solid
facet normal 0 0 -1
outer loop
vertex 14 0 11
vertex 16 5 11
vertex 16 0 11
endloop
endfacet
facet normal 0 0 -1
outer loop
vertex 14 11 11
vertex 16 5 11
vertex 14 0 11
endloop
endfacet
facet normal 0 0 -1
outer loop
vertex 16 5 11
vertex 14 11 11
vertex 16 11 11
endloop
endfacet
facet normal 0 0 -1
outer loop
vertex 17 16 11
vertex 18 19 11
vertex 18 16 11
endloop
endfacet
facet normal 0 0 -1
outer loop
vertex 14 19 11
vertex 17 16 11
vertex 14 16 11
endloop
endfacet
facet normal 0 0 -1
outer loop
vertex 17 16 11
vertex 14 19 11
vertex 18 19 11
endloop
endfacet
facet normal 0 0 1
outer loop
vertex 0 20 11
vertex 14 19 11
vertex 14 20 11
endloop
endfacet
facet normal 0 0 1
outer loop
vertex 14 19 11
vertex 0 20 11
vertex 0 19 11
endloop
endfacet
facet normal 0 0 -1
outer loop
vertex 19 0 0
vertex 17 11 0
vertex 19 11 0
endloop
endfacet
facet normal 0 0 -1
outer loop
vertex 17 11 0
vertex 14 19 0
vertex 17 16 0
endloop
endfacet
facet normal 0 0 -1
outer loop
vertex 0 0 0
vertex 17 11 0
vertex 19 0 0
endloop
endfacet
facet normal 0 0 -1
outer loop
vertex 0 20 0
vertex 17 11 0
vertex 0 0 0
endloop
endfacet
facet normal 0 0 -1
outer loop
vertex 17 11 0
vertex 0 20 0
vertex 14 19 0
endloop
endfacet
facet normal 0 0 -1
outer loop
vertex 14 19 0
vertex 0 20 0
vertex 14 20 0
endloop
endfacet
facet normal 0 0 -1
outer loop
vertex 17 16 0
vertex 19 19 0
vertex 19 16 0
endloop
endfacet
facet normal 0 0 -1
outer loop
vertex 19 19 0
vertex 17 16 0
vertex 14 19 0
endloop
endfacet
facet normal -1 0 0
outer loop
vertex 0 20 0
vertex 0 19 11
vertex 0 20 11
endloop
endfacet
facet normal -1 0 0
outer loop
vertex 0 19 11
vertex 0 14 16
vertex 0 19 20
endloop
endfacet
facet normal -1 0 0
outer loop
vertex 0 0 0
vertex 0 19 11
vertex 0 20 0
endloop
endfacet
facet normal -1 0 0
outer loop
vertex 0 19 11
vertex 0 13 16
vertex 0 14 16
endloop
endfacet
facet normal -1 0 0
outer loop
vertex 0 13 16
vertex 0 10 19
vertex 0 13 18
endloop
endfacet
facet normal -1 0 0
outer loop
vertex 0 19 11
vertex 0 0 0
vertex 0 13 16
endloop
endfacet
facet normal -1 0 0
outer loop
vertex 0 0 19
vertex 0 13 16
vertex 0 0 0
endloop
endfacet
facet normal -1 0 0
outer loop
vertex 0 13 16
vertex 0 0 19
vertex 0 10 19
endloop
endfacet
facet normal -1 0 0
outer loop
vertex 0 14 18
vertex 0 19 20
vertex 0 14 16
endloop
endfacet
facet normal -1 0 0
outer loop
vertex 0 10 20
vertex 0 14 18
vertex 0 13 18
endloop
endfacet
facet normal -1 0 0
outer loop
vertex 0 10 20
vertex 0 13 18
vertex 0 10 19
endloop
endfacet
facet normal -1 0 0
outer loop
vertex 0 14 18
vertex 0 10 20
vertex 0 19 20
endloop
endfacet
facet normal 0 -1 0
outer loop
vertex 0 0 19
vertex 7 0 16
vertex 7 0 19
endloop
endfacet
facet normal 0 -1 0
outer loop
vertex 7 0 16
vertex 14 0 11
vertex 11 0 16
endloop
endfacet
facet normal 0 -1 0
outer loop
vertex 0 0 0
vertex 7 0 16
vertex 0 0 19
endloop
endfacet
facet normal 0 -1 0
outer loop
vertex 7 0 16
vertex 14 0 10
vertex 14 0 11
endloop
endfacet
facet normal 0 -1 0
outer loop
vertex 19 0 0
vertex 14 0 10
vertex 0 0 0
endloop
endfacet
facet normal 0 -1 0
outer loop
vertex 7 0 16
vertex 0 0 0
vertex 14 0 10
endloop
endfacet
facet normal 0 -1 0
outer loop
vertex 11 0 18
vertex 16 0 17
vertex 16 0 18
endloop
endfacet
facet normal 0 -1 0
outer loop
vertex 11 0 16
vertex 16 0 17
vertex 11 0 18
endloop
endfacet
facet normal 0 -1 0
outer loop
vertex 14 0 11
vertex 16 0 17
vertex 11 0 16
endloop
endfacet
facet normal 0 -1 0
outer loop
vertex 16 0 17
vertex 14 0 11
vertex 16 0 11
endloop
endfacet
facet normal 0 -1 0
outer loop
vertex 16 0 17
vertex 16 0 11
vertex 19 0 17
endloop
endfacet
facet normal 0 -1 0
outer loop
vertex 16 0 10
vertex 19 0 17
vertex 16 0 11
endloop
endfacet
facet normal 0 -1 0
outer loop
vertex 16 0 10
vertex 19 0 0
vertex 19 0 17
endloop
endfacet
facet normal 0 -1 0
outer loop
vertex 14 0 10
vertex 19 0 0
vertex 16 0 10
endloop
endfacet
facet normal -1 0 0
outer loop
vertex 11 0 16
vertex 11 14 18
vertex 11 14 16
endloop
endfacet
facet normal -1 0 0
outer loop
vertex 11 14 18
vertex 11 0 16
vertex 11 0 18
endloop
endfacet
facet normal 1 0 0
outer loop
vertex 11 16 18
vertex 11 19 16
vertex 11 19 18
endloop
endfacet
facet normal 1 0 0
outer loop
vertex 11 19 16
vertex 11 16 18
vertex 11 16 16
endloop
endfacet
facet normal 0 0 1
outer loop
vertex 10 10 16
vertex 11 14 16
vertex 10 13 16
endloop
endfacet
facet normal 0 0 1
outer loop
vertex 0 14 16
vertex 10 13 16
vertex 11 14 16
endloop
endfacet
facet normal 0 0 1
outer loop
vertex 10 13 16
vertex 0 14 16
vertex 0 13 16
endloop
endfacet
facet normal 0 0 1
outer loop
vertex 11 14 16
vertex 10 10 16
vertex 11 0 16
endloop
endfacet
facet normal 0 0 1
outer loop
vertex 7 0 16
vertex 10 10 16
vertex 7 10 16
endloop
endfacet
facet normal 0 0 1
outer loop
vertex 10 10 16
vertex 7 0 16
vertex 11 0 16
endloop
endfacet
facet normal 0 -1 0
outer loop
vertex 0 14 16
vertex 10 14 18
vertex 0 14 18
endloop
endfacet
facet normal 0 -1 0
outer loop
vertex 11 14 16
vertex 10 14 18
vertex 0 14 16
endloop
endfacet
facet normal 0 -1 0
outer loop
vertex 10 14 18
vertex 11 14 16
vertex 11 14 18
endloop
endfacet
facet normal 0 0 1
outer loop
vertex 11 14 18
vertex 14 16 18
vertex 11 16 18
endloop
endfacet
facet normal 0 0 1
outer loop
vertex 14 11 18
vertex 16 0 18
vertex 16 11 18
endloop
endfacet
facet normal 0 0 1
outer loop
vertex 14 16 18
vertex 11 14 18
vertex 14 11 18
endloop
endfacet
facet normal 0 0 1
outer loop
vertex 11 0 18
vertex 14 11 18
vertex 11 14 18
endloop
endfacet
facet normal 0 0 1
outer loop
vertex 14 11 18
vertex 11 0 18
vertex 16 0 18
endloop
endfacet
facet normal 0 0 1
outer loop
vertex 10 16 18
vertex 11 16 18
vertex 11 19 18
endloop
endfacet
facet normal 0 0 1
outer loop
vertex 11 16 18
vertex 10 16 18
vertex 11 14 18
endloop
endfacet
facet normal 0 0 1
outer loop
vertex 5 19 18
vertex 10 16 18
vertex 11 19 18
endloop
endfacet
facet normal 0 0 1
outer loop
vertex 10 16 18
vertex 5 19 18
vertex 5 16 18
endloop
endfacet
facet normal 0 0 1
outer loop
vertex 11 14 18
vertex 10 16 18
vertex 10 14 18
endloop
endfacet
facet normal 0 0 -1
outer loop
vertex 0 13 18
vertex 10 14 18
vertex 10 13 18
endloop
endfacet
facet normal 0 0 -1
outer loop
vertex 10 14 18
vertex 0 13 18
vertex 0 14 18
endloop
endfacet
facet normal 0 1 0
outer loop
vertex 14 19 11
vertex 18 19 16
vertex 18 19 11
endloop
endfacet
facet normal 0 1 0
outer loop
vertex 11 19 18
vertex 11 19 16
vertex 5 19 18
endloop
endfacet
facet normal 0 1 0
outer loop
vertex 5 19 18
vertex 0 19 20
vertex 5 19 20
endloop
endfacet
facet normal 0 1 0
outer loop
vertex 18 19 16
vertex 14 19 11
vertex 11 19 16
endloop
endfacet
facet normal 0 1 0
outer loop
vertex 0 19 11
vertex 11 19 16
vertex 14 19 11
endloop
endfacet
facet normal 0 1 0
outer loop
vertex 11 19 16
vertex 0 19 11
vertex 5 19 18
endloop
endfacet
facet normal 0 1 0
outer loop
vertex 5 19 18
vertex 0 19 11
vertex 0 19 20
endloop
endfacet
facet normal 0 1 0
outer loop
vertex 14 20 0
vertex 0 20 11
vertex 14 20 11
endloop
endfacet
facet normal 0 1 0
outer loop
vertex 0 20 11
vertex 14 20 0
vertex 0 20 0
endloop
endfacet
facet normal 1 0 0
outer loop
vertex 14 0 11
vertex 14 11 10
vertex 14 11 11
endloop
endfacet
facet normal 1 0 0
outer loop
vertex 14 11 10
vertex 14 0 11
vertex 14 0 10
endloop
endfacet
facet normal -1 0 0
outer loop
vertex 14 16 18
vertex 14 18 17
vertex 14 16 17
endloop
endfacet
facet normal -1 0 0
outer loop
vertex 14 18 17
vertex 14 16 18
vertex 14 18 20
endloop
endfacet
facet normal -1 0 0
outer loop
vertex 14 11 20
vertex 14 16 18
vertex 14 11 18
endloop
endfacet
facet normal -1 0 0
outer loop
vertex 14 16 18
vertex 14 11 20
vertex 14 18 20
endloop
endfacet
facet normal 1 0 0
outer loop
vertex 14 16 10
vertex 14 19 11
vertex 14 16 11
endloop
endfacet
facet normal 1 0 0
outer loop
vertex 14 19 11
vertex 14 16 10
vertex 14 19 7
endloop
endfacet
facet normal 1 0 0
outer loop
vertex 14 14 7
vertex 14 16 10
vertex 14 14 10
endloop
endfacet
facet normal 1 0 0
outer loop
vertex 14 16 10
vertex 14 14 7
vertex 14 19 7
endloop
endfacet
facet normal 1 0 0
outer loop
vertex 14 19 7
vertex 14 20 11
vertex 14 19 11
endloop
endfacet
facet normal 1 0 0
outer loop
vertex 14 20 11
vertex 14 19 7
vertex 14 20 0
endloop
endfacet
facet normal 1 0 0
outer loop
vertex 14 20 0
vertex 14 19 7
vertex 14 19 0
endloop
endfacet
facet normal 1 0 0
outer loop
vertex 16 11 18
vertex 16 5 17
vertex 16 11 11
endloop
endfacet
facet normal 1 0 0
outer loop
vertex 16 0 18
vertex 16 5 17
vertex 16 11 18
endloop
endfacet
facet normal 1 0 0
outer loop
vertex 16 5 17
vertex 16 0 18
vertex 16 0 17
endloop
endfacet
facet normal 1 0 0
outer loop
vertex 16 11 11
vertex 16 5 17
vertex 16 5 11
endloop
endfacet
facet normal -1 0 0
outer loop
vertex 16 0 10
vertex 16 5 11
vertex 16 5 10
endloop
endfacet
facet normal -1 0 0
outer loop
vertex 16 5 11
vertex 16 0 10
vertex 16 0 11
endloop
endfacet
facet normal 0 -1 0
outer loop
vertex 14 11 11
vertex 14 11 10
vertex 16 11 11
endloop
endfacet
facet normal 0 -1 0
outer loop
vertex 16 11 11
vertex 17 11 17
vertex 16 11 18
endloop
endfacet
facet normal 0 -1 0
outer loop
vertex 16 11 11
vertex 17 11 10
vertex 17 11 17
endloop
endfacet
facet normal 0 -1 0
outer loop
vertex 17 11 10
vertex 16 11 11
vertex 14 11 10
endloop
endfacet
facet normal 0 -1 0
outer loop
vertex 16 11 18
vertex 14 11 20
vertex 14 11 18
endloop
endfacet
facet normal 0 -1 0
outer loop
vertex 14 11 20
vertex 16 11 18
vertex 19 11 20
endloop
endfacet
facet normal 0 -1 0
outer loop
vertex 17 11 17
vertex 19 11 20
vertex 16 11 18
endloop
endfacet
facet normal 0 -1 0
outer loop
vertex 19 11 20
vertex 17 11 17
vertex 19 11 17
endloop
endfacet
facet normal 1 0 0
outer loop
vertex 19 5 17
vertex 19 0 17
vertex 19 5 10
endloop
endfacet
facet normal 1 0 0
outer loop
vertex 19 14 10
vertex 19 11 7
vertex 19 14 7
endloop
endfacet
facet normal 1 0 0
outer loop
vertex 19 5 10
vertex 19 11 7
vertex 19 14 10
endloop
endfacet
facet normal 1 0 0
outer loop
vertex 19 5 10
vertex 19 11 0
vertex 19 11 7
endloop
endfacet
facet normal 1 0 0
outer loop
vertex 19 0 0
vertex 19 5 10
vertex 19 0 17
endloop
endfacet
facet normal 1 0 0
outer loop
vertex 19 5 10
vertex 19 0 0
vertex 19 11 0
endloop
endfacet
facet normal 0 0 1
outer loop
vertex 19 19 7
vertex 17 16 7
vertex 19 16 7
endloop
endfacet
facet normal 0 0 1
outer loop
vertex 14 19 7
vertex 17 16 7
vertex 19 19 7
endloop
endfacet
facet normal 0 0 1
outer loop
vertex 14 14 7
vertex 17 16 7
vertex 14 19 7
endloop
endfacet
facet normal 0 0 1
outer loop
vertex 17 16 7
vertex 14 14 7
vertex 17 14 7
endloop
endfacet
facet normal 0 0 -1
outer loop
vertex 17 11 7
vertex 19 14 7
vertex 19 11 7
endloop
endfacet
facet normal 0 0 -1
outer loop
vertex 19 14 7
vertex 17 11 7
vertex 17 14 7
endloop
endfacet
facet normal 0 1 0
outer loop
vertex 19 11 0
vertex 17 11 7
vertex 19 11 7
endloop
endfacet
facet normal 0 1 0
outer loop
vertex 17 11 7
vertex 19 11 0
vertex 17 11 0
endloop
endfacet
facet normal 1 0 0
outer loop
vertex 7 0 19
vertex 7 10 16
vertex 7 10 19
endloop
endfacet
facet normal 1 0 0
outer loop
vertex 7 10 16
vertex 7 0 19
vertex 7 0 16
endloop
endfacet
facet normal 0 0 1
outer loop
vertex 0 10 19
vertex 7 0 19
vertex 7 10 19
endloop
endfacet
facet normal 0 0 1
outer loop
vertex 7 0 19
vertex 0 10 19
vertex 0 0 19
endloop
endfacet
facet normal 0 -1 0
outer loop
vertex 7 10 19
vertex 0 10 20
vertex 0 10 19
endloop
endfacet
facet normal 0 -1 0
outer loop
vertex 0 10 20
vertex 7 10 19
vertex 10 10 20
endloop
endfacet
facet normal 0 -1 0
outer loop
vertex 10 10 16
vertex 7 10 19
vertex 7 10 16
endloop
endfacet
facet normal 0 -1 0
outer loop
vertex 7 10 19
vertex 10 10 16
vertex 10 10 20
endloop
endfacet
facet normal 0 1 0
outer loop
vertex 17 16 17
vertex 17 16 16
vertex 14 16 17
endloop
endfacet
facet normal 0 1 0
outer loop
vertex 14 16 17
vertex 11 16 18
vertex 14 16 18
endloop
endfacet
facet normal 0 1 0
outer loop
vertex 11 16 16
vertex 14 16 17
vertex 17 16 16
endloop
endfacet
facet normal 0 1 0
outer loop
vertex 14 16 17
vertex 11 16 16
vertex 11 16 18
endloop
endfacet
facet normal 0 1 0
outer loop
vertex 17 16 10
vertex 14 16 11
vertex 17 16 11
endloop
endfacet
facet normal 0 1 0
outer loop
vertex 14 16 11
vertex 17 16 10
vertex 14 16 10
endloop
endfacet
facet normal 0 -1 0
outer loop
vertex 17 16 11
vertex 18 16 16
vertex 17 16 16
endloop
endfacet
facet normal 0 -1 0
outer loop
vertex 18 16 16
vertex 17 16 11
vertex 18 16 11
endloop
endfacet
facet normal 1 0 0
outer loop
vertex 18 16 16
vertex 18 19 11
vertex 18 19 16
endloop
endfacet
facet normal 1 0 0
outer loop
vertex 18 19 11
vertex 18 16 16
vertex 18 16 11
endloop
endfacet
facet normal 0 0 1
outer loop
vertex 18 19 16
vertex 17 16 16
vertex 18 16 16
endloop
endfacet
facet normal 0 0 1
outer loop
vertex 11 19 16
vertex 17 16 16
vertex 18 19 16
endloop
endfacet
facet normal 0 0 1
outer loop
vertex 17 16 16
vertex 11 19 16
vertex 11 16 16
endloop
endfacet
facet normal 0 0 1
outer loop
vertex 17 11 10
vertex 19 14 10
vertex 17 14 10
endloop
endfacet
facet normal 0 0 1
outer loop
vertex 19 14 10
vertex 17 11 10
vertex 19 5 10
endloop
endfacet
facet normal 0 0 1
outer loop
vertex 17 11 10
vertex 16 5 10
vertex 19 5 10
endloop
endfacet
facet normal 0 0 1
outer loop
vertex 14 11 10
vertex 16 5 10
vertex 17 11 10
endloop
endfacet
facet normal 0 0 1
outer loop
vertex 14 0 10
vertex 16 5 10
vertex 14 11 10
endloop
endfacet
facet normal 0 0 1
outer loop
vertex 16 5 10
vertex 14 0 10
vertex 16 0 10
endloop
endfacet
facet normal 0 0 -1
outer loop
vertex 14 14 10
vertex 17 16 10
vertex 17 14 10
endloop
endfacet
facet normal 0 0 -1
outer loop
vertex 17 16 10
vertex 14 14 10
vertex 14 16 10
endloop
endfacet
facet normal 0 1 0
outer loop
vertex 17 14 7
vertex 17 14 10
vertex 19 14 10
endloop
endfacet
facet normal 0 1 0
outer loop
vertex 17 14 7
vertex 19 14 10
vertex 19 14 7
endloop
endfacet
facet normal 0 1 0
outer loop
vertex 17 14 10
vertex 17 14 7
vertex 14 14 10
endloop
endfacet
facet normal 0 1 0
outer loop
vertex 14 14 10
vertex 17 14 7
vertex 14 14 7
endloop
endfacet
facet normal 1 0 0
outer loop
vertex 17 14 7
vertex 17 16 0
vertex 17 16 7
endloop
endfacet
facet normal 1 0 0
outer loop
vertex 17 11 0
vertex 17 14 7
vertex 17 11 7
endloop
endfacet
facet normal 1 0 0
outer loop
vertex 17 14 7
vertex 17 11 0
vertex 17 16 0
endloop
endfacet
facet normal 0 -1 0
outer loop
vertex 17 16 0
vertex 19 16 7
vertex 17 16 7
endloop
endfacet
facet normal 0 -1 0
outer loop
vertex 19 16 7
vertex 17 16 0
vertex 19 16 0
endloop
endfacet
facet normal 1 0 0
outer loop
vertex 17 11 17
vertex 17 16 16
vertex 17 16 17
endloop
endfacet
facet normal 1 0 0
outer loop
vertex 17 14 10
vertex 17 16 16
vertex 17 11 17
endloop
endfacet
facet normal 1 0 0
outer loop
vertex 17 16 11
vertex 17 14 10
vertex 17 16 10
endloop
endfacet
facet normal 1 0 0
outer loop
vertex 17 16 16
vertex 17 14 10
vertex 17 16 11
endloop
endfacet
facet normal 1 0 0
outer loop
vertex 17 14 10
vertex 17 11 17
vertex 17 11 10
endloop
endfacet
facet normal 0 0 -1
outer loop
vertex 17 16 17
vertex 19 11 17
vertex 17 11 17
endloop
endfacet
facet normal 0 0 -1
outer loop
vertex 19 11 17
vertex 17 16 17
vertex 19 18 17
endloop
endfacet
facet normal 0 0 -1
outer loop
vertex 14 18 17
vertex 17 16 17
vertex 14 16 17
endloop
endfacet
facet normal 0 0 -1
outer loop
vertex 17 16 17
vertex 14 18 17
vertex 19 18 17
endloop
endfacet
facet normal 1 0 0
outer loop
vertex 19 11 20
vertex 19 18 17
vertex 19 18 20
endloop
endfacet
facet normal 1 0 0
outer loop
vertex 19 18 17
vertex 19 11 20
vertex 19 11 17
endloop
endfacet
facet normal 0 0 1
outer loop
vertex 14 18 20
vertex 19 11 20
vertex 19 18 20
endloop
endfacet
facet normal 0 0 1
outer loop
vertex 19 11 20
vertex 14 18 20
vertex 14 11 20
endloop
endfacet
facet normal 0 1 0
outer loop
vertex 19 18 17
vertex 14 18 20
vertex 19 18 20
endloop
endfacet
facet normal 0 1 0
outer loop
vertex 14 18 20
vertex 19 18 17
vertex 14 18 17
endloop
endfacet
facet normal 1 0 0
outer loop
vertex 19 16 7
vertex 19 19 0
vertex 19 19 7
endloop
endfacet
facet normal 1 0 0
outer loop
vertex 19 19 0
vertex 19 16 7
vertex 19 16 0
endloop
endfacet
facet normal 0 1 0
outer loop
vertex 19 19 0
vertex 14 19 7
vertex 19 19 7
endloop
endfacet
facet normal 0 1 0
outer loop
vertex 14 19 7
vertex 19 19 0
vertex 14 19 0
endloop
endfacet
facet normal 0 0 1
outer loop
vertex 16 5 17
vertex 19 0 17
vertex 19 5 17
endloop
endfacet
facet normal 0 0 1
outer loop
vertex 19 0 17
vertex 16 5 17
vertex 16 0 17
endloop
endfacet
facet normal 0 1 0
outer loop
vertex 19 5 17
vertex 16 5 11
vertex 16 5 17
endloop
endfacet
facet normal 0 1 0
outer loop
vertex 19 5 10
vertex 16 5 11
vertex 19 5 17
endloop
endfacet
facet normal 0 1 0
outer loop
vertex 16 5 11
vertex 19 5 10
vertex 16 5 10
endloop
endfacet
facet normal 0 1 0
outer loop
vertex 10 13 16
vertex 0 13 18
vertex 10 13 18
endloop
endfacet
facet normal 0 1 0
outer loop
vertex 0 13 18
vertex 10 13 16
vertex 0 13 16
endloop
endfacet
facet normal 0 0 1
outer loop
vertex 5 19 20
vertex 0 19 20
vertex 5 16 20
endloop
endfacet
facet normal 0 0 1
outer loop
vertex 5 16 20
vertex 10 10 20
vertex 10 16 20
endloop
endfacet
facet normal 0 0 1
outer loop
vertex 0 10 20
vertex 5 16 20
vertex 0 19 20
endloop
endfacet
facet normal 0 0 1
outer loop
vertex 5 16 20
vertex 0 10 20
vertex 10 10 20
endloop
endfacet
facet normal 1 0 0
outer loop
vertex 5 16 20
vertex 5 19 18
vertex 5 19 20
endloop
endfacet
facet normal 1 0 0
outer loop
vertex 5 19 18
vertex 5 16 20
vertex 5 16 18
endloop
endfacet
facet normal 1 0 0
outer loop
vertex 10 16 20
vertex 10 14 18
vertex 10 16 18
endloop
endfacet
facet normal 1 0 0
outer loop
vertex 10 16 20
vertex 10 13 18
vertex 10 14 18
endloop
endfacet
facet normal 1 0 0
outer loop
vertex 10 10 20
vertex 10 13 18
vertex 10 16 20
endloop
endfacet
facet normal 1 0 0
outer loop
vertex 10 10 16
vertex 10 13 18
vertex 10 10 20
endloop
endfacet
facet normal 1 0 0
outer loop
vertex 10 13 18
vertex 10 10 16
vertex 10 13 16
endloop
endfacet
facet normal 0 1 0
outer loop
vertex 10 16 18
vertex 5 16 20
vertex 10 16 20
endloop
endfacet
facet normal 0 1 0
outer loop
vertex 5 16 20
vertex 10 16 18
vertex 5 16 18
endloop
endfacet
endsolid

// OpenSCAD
translate([3.5, 2.5, 5.5]) color([0.37864807032309444, 0.8754233917130172, 0.5681514209101919]) cube([7, 5, 11], center=true);
translate([5.5, 3.5, 13.5]) color([0.4144063966836443, 0.40226707511907955, 0.7018296239336754]) cube([11, 7, 5], center=true);
translate([3.5, 7.5, 5.5]) color([0.41822655329246605, 0.6621958889738174, 0.04677968595679827]) cube([7, 5, 11], center=true);
translate([5.5, 10.5, 13.5]) color([0.44535218971882984, 0.25922692344722276, 0.15768657212231085]) cube([11, 7, 5], center=true);
translate([3.5, 12.5, 5.5]) color([0.5275731301676146, 0.48726560106903205, 0.5614049256144269]) cube([7, 5, 11], center=true);
translate([5.5, 16.5, 14.5]) color([0.7554847672586825, 0.8838751542487009, 0.4945826703752868]) cube([11, 5, 7], center=true);
translate([3.5, 17.5, 5.5]) color([0.31205824641687296, 0.46689223535252355, 0.8090458573603624]) cube([7, 5, 11], center=true);
translate([10.5, 2.5, 5.5]) color([0.8750163314802711, 0.8124149323637591, 0.188001294050828]) cube([7, 5, 11], center=true);
translate([10.5, 7.5, 5.5]) color([0.9994203594553304, 0.6330887599183004, 0.08346705017572931]) cube([7, 5, 11], center=true);
translate([10.5, 12.5, 5.5]) color([0.7255543554613124, 0.9868214802051282, 0.40181682221254356]) cube([7, 5, 11], center=true);
translate([10.5, 17.5, 5.5]) color([0.6785150052419683, 0.31617713722134233, 0.2135246620646961]) cube([7, 5, 11], center=true);
translate([13.5, 5.5, 14.5]) color([0.7173241433110372, 0.0023575647193538884, 0.8227314105314157]) cube([5, 11, 7], center=true);
translate([16.5, 5.5, 3.5]) color([0.5283459768597928, 0.09778434180065931, 0.11890389478474583]) cube([5, 11, 7], center=true);
translate([3.5, 2.5, 17.5]) color([0.6492654248961536, 0.8736538239003423, 0.27998274332687256]) cube([7, 5, 3], center=true);
translate([3.5, 7.5, 17.5]) color([0.9785151867733981, 0.10018068906370903, 0.8539381095973382]) cube([7, 5, 3], center=true);
translate([12.5, 13.5, 14.5]) color([0.39669617733090445, 0.08134541676823415, 0.2747138434192621]) cube([3, 5, 7], center=true);
translate([14.5, 17.5, 13.5]) color([0.4529781848179143, 0.7923415311856522, 0.8613599036372361]) cube([7, 3, 5], center=true);
translate([16.5, 3.5, 8.5]) color([0.13342055420254906, 0.5208655284141989, 0.6507832381497373]) cube([5, 7, 3], center=true);
translate([16.5, 10.5, 8.5]) color([0.3470530145996015, 0.8718638357105861, 0.27840981521636055]) cube([5, 7, 3], center=true);
translate([15.5, 13.5, 3.5]) color([0.01857432754559518, 0.0406632736752609, 0.6809967701112433]) cube([3, 5, 7], center=true);
translate([15.5, 13.5, 13.5]) color([0.5583557360970469, 0.946502554169996, 0.9384387997349186]) cube([3, 5, 7], center=true);
translate([16.5, 14.5, 18.5]) color([0.9098511774051025, 0.04200453196734122, 0.7491348233908631]) cube([5, 7, 3], center=true);
translate([16.5, 17.5, 3.5]) color([0.7013248175948597, 0.6553618646747296, 0.7123576525162417]) cube([5, 3, 7], center=true);
translate([17.5, 2.5, 13.5]) color([0.9027101506193307, 0.6401411997932241, 0.372449262972256]) cube([3, 5, 7], center=true);
translate([2.5, 11.5, 17.0]) color([0.5379287837318205, 0.20784410369082473, 0.5871255046951435]) cube([5, 3, 2], center=true);
translate([2.5, 11.5, 19.0]) color([0.008897082049078797, 0.15102317386398778, 0.3334083880298664]) cube([5, 3, 2], center=true);
translate([2.5, 14.5, 19.0]) color([0.7896231589257826, 0.7184994227715396, 0.3382559700266786]) cube([5, 3, 2], center=true);
translate([2.5, 17.5, 19.0]) color([0.6205381083165517, 0.041202949506209285, 0.16386054567557595]) cube([5, 3, 2], center=true);
translate([7.5, 11.5, 17.0]) color([0.9819140701253054, 0.28953085363586695, 0.39479198298829066]) cube([5, 3, 2], center=true);
translate([7.5, 11.5, 19.0]) color([0.5484842965725134, 0.29340700145733656, 0.47806466915102097]) cube([5, 3, 2], center=true);
translate([7.5, 14.5, 19.0]) color([0.2397060836386239, 0.04825636228829444, 0.17958684904155564]) cube([5, 3, 2], center=true);
